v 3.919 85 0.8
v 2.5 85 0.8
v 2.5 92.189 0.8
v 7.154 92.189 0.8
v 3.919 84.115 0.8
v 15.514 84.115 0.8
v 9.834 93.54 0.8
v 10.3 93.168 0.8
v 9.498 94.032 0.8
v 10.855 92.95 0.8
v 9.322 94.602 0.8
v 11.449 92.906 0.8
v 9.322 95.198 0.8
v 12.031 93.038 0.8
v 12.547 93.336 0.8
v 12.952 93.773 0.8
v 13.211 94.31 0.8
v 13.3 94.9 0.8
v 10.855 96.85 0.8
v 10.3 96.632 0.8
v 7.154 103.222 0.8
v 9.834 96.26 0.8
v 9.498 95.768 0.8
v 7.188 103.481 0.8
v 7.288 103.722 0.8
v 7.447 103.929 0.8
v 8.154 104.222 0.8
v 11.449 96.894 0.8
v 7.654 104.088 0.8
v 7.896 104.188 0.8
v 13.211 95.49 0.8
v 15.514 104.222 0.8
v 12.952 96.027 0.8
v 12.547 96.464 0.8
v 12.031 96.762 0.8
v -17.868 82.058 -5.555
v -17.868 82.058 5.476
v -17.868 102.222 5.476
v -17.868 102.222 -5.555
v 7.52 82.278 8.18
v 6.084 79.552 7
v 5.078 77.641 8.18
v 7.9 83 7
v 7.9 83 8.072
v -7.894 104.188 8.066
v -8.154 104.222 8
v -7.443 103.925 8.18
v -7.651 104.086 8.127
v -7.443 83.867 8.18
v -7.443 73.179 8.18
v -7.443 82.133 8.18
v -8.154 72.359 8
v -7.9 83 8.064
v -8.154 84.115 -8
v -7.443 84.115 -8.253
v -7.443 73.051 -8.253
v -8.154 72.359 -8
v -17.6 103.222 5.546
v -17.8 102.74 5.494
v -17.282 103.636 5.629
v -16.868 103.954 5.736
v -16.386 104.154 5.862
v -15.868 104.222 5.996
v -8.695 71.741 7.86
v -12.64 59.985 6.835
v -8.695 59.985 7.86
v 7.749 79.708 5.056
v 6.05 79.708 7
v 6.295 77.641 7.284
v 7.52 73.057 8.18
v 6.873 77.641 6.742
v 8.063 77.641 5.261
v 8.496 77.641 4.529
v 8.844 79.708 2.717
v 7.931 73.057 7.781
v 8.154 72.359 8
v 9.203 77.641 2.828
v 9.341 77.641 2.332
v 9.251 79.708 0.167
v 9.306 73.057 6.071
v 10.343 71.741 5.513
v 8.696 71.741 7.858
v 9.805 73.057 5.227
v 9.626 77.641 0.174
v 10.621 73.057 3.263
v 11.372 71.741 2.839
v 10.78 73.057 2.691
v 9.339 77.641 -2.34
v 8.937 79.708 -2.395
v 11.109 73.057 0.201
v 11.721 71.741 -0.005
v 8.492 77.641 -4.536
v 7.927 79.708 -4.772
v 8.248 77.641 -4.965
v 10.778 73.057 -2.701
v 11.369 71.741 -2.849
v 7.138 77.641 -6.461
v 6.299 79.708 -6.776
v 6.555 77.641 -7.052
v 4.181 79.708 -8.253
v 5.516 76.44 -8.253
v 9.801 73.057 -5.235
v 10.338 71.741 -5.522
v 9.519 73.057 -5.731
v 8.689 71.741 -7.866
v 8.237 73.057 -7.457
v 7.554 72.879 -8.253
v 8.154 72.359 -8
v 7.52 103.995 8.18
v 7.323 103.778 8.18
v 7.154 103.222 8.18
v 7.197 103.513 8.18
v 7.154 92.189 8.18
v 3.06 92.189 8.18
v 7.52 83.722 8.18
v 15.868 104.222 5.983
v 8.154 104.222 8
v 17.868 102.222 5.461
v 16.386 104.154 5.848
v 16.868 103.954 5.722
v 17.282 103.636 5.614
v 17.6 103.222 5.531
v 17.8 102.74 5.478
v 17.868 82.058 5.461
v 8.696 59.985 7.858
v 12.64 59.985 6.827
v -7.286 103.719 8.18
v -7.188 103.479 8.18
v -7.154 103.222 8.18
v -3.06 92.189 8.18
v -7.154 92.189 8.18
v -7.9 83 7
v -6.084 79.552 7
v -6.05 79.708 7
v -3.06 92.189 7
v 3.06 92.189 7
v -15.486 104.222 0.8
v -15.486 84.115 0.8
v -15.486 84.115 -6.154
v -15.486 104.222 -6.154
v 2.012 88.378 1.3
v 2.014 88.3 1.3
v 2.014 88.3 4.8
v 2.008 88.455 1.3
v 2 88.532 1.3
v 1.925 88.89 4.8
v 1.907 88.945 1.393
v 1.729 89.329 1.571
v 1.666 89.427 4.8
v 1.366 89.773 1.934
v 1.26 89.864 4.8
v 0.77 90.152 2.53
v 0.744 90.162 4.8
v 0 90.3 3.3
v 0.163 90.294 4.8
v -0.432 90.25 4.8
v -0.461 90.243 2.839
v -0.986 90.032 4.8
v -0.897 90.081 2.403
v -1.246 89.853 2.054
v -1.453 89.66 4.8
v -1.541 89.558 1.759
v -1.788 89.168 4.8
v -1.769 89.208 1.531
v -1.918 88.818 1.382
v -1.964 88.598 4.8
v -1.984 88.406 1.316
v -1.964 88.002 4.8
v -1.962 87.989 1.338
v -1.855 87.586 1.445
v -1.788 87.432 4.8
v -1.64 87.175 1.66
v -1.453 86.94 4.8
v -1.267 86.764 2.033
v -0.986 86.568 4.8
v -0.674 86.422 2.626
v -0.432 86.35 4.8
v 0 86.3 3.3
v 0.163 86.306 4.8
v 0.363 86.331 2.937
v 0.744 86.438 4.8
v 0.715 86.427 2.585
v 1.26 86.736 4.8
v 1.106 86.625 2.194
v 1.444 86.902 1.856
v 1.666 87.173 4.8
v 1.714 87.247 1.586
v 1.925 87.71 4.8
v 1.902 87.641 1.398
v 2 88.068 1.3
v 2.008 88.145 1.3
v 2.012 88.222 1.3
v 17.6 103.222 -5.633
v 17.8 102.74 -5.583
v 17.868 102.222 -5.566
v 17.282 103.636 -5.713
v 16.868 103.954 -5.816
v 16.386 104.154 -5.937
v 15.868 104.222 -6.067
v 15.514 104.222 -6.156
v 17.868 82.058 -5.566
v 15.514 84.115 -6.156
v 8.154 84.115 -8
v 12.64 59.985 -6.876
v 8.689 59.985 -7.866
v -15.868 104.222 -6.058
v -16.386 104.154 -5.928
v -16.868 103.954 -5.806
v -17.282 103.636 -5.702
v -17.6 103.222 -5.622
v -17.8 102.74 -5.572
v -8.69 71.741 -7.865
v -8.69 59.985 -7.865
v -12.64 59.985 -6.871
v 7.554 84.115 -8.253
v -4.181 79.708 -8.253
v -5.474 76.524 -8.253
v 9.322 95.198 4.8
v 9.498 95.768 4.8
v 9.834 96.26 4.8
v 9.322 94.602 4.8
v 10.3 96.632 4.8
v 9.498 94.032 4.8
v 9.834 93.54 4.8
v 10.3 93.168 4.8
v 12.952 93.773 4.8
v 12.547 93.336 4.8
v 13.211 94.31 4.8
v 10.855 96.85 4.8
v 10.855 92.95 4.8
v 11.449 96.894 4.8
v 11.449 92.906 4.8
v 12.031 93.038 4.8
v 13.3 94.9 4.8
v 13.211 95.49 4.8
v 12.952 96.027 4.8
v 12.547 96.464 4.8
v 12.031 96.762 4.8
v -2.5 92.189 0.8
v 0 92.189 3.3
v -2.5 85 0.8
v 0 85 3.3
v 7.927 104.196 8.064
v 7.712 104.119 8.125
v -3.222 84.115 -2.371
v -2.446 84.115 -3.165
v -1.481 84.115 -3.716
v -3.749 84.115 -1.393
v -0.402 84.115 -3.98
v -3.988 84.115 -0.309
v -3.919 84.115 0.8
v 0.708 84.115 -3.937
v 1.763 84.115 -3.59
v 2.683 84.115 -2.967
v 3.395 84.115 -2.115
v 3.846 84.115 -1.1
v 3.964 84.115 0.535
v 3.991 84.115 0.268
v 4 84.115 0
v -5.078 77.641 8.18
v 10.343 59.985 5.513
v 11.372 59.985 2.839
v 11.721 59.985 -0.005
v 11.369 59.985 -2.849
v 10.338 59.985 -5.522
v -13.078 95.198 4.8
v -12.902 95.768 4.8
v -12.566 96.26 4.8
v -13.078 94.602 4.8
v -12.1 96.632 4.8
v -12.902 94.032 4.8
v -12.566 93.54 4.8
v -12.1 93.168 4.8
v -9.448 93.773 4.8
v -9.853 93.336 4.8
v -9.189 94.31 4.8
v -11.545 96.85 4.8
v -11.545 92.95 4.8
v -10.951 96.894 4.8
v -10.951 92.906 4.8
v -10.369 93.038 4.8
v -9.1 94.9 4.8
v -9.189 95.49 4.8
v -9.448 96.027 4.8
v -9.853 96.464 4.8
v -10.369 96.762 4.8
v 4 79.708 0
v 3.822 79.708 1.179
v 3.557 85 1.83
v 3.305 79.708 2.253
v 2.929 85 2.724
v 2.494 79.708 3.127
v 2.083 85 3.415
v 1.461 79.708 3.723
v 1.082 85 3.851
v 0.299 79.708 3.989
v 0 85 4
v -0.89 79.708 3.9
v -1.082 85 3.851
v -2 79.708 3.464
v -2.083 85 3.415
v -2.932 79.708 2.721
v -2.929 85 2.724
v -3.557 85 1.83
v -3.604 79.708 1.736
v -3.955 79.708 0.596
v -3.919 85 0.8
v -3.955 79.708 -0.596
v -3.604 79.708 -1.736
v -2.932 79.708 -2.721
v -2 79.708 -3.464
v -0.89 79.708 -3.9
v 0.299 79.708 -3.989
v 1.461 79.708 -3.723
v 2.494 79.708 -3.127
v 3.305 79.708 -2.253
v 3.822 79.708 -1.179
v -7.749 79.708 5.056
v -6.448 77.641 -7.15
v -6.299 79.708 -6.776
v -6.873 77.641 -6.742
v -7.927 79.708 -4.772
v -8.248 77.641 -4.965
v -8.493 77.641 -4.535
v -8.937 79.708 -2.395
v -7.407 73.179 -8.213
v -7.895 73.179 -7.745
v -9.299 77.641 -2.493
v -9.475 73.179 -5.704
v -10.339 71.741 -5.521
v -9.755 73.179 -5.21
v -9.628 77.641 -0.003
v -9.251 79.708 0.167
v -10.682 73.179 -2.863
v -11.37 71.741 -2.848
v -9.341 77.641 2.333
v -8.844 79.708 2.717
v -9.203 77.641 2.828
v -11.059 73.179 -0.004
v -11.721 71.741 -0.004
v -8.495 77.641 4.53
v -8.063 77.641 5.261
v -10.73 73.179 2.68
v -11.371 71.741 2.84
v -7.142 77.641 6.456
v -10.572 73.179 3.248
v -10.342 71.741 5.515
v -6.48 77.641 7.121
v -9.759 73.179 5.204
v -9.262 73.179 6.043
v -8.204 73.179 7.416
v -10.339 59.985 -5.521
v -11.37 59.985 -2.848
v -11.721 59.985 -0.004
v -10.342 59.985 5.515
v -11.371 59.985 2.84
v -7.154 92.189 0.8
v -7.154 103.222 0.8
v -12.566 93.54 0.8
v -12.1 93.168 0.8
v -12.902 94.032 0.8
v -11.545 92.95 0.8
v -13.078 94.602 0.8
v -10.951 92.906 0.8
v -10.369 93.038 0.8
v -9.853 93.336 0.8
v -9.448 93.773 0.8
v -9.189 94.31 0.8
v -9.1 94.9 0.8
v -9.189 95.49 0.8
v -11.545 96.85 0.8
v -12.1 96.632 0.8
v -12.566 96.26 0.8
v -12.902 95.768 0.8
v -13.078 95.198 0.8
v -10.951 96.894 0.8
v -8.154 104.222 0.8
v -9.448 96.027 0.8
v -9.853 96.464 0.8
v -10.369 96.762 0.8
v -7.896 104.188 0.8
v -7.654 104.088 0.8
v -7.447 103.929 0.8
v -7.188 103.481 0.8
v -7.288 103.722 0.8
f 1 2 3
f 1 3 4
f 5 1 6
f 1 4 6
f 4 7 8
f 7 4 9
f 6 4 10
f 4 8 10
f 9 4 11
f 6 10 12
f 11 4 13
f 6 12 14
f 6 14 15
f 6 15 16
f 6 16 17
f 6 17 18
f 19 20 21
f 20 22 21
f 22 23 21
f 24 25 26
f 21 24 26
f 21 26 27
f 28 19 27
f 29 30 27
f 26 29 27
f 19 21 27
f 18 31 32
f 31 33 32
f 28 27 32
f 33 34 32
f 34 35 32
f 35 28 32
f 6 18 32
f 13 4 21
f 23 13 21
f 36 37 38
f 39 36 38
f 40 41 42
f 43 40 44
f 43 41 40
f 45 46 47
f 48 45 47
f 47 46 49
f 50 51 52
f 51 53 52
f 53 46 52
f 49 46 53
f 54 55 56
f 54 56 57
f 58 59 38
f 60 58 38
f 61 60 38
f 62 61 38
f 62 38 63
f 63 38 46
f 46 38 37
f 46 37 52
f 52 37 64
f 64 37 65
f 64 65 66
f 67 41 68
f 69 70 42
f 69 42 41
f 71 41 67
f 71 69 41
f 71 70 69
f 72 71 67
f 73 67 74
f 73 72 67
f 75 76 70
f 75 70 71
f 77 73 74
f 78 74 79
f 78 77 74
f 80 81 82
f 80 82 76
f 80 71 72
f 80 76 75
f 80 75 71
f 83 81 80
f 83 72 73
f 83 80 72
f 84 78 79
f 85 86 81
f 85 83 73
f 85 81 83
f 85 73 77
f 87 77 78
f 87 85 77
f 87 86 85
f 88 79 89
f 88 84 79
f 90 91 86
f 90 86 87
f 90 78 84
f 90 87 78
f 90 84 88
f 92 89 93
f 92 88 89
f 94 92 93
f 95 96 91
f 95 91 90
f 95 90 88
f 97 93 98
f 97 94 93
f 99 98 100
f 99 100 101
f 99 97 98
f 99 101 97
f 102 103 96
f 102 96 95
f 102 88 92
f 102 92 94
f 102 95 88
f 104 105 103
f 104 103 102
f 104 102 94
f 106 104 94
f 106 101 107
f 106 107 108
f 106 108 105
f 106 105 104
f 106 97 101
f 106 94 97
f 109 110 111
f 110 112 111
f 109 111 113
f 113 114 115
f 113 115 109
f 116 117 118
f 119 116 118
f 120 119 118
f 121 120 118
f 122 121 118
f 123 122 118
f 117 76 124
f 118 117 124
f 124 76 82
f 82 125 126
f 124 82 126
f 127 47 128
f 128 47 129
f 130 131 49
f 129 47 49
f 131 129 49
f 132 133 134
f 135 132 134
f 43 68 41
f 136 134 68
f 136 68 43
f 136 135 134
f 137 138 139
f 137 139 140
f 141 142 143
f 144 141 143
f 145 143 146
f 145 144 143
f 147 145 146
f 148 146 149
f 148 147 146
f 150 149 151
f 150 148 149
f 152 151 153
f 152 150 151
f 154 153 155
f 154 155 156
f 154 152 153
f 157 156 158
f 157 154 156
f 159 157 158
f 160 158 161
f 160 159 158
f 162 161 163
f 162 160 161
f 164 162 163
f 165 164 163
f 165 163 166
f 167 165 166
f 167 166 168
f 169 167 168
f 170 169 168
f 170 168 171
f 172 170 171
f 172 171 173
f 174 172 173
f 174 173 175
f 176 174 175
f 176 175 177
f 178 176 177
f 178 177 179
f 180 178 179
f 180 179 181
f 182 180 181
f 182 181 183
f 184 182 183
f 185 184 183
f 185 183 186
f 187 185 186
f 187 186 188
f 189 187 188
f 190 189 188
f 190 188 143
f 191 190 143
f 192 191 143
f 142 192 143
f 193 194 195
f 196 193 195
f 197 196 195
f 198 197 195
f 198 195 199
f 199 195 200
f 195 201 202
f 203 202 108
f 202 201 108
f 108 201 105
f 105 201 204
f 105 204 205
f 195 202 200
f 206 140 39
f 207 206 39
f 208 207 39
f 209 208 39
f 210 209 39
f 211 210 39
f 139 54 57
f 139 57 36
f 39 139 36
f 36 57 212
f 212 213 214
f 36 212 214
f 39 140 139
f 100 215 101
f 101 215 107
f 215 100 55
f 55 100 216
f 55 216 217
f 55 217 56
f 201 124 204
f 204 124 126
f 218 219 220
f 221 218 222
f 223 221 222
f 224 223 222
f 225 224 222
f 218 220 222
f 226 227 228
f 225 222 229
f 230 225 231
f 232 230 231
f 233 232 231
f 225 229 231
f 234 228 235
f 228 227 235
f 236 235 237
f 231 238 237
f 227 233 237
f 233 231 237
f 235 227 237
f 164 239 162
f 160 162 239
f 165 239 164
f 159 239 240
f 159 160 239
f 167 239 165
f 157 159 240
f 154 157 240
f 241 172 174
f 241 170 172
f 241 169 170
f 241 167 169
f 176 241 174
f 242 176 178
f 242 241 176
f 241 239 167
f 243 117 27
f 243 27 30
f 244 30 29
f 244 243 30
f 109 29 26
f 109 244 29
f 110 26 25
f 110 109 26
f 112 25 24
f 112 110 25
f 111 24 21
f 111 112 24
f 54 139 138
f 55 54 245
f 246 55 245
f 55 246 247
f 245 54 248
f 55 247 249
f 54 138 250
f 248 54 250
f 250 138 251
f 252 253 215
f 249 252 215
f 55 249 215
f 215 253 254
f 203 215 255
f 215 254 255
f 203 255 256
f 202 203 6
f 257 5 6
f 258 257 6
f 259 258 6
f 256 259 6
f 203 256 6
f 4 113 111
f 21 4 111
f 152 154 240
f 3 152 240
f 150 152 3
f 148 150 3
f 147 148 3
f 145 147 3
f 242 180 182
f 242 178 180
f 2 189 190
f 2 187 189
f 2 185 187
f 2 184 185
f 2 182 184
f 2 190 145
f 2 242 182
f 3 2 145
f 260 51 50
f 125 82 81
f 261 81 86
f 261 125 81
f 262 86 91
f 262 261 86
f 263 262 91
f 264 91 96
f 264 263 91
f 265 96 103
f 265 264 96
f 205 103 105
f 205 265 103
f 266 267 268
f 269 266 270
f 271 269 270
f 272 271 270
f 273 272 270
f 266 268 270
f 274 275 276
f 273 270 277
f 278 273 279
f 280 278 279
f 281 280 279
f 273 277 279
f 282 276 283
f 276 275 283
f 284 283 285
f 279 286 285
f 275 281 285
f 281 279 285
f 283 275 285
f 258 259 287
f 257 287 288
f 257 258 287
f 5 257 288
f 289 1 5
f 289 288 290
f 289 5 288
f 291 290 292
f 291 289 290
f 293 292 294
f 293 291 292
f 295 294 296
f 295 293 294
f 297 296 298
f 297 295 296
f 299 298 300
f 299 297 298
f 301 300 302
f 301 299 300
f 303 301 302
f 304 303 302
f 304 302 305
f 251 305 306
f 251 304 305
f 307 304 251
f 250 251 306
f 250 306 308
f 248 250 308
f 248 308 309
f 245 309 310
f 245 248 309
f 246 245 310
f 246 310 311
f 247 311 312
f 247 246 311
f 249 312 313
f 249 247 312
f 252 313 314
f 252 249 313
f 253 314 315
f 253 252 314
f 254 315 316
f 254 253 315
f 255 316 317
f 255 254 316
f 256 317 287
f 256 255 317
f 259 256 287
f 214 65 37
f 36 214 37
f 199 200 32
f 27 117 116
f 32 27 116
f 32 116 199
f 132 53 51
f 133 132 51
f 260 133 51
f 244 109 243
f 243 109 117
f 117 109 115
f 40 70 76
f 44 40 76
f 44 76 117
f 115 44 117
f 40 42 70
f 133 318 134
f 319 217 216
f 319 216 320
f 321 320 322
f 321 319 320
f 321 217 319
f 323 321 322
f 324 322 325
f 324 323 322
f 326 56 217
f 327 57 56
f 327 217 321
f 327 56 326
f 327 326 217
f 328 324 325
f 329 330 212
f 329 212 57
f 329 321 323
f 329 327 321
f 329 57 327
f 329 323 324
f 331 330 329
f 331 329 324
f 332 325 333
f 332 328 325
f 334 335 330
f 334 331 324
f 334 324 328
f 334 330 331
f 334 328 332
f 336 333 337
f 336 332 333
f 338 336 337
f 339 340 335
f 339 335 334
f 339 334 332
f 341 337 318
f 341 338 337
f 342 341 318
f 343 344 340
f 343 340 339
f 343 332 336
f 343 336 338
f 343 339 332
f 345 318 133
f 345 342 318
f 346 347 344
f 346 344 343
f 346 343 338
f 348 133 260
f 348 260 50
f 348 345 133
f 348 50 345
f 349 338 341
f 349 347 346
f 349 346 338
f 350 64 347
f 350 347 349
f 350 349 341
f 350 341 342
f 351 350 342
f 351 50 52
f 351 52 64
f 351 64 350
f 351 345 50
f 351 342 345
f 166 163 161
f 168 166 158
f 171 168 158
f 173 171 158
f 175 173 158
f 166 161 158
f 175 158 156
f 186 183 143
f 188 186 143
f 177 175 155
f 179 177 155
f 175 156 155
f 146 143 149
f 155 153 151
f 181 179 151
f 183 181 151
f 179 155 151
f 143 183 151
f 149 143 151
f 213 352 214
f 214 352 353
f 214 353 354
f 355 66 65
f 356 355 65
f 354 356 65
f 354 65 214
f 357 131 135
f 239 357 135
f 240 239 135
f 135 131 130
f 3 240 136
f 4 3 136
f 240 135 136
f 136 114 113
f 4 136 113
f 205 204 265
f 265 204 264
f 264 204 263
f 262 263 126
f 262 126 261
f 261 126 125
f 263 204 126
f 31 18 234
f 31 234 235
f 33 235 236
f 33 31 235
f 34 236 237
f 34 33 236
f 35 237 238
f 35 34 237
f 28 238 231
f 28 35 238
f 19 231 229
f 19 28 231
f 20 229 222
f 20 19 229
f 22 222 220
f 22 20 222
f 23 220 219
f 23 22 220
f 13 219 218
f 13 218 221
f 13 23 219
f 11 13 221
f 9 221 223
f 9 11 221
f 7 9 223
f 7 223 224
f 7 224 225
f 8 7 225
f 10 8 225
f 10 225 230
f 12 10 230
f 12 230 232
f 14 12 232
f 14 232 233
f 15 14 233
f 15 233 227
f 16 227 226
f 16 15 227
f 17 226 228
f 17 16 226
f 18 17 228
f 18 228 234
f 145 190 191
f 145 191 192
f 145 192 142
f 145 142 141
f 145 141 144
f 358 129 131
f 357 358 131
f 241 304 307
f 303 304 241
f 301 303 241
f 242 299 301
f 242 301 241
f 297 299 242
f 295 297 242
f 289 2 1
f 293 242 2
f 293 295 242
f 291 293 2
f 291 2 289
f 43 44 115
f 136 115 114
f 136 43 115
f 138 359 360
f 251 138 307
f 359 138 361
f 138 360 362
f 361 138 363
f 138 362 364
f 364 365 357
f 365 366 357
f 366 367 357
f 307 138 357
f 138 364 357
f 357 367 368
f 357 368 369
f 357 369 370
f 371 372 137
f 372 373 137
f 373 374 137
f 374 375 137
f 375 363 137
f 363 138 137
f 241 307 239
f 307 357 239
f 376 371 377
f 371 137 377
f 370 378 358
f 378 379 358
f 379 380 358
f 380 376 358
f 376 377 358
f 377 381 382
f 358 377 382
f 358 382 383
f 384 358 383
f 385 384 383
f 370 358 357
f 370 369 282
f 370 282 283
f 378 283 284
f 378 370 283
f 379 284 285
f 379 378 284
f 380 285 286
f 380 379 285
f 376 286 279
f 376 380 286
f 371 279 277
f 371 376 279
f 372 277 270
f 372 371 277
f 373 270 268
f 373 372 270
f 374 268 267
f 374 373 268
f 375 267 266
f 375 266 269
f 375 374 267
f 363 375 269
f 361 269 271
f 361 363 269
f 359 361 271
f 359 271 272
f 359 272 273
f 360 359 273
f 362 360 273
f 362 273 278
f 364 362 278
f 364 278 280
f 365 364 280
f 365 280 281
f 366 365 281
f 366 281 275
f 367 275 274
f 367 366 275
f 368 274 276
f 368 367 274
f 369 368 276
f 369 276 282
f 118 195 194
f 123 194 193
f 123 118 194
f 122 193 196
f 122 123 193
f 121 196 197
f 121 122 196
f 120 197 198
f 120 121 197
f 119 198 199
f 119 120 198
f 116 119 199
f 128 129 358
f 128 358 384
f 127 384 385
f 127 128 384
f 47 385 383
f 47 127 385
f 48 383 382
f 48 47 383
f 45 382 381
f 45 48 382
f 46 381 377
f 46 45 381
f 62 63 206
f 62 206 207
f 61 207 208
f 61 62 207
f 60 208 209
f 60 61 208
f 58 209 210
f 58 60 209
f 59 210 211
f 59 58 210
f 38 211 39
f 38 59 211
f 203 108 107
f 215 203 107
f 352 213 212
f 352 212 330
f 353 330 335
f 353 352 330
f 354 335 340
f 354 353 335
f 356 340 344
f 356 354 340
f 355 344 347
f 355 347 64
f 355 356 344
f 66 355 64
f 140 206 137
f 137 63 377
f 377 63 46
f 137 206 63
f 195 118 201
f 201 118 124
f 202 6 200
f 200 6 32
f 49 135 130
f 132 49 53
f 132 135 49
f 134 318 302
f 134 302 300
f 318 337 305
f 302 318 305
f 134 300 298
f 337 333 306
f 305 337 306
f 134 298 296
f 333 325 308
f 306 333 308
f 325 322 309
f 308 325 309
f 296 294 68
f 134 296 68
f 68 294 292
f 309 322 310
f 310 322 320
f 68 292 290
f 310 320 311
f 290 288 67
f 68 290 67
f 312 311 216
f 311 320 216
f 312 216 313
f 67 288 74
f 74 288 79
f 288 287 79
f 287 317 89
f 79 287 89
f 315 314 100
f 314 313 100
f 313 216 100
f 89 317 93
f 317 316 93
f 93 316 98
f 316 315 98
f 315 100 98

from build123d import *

# Parameters (mm, degrees)
PAD_DEPTH       = 12
POCKET_DEPTH    = 62
SKETCH019_W     = 31
SKETCH019_H     = 21.780884
POCKET002_DEPTH = 17
SKETCH020_R     = 2
POCKET003_DEPTH = 4
CYLINDER_R      = 4
CYLINDER_DEPTH  = 28
POCKET032_DEPTH = 5
SKETCH084_W     = 7.885986
SKETCH084_H     = 7.189331
PAD020_DEPTH    = 0.5
POCKET038_DEPTH = 100


with BuildPart() as part:
    # Sketch010 → Pad (new body, symmetric)
    with BuildSketch(Plane.XY):
        with BuildLine():
            Line((12.639868, 59.984547), (-12.639868, 59.984547))
            Line((-12.639868, 59.984547), (-17.867889, 82.058411))
            Line((-17.867889, 82.058411), (-17.867889, 102.222236))
            ThreePointArc((-15.867889, 104.222236), (-17.282103, 103.63645), (-17.867889, 102.222236))
            Line((-15.867889, 104.222236), (-8.154342, 104.222236))
            ThreePointArc((-7.154342, 103.222236), (-7.447235, 103.929343), (-8.154342, 104.222236))
            Line((-7.154342, 103.222236), (-7.154342, 92.189331))
            Line((-7.154342, 92.189331), (7.154342, 92.189331))
            Line((7.154342, 92.189331), (7.154342, 103.222236))
            ThreePointArc((8.154342, 104.222236), (7.447235, 103.929343), (7.154342, 103.222236))
            Line((8.154342, 104.222236), (15.867889, 104.222236))
            ThreePointArc((17.867889, 102.222236), (17.282103, 103.63645), (15.867889, 104.222236))
            Line((17.867889, 102.222236), (17.867889, 82.058411))
            Line((17.867889, 82.058411), (12.639868, 59.984547))
        make_face()
    extrude(amount=PAD_DEPTH, both=True)

    # Sketch011 → Pocket (cut)
    with BuildSketch(Plane.XZ.offset(-54)):
        Polygon((0, 13.813917), (-22.117895, 13.813917), (-22.117895, -0.189388), (-22.117895, -17.743416), (0, -17.743416), (22.658901, -17.743416), (22.658901, -0.111897), (22.658901, 13.813917), align=None)
        Polygon((-18.596464, 0), (-18.596464, 5.287208), (-8.154342, 8), (-7.443202, 8.179805), (0, 8.179805), (7.519913, 8.179805), (8.154342, 8), (18.531284, 5.287208), (18.531284, -0.112287), (18.531284, -5.399495), (8.154342, -8), (7.554242, -8.253323), (0.11104, -8.253323), (-7.443202, -8.253323), (-8.154342, -8), (-18.596464, -5.371119), align=None, mode=Mode.SUBTRACT)
    extrude(amount=-POCKET_DEPTH, mode=Mode.SUBTRACT)

    # Sketch019 → Pocket002 (cut)
    with BuildSketch(Plane.XY.offset(0.8)):
        with Locations((0.01352, 95.005211)):
            Rectangle(SKETCH019_W, SKETCH019_H)
    extrude(amount=-POCKET002_DEPTH, mode=Mode.SUBTRACT)

    # Sketch020 → Pocket003 (cut)
    with BuildSketch(Plane.XY.offset(0.8)):
        with Locations((-11.1, 94.9)):
            Circle(SKETCH020_R)
        with Locations((11.3, 94.9)):
            Circle(SKETCH020_R)
        with Locations((0.013518, 88.3)):
            Circle(SKETCH020_R)
    extrude(amount=POCKET003_DEPTH, mode=Mode.SUBTRACT)

    # Cylinder → Cylinder (cut)
    with BuildSketch(Plane.XZ.offset(-85)):
        Circle(CYLINDER_R)
    extrude(amount=CYLINDER_DEPTH, mode=Mode.SUBTRACT)

    # Sketch067 → Pocket032 (cut)
    with BuildSketch(Plane.XY.offset(7)):
        Polygon((-7.9, 83), (0, 68), (7.9, 83), (0, 98), align=None)
    extrude(amount=POCKET032_DEPTH, mode=Mode.SUBTRACT)

    # Sketch084 → Pad020 (join)
    with BuildSketch(Plane.XY.offset(0.8)):
        with Locations((-0.023809, 88.594665)):
            Rectangle(SKETCH084_W, SKETCH084_H)
    extrude(amount=PAD020_DEPTH)

    # Sketch085 → Groove (revolve, cut)
    with BuildSketch(Plane.XY):
        with BuildLine():
            ThreePointArc((9.252061, 79.708405), (10.164814, 75.624968), (11.720768, 71.740822))
            Line((11.720768, 71.740822), (11.720768, 58.4589))
            Line((11.720768, 58.4589), (0, 58.4589))
            Line((0, 58.4589), (0, 79.708405))
            Line((9.252061, 79.708405), (0, 79.708405))
        make_face()
    revolve(axis=Axis((0, 0, 0), (0, 1, 0)), mode=Mode.SUBTRACT)

    # Sketch089 → Pocket038 (cut)
    with BuildSketch(Plane.XZ):
        Polygon((-2.5, 0.8), (0, 3.3), (2.5, 0.8), align=None)
    extrude(amount=-POCKET038_DEPTH, mode=Mode.SUBTRACT)


solid = part.part
